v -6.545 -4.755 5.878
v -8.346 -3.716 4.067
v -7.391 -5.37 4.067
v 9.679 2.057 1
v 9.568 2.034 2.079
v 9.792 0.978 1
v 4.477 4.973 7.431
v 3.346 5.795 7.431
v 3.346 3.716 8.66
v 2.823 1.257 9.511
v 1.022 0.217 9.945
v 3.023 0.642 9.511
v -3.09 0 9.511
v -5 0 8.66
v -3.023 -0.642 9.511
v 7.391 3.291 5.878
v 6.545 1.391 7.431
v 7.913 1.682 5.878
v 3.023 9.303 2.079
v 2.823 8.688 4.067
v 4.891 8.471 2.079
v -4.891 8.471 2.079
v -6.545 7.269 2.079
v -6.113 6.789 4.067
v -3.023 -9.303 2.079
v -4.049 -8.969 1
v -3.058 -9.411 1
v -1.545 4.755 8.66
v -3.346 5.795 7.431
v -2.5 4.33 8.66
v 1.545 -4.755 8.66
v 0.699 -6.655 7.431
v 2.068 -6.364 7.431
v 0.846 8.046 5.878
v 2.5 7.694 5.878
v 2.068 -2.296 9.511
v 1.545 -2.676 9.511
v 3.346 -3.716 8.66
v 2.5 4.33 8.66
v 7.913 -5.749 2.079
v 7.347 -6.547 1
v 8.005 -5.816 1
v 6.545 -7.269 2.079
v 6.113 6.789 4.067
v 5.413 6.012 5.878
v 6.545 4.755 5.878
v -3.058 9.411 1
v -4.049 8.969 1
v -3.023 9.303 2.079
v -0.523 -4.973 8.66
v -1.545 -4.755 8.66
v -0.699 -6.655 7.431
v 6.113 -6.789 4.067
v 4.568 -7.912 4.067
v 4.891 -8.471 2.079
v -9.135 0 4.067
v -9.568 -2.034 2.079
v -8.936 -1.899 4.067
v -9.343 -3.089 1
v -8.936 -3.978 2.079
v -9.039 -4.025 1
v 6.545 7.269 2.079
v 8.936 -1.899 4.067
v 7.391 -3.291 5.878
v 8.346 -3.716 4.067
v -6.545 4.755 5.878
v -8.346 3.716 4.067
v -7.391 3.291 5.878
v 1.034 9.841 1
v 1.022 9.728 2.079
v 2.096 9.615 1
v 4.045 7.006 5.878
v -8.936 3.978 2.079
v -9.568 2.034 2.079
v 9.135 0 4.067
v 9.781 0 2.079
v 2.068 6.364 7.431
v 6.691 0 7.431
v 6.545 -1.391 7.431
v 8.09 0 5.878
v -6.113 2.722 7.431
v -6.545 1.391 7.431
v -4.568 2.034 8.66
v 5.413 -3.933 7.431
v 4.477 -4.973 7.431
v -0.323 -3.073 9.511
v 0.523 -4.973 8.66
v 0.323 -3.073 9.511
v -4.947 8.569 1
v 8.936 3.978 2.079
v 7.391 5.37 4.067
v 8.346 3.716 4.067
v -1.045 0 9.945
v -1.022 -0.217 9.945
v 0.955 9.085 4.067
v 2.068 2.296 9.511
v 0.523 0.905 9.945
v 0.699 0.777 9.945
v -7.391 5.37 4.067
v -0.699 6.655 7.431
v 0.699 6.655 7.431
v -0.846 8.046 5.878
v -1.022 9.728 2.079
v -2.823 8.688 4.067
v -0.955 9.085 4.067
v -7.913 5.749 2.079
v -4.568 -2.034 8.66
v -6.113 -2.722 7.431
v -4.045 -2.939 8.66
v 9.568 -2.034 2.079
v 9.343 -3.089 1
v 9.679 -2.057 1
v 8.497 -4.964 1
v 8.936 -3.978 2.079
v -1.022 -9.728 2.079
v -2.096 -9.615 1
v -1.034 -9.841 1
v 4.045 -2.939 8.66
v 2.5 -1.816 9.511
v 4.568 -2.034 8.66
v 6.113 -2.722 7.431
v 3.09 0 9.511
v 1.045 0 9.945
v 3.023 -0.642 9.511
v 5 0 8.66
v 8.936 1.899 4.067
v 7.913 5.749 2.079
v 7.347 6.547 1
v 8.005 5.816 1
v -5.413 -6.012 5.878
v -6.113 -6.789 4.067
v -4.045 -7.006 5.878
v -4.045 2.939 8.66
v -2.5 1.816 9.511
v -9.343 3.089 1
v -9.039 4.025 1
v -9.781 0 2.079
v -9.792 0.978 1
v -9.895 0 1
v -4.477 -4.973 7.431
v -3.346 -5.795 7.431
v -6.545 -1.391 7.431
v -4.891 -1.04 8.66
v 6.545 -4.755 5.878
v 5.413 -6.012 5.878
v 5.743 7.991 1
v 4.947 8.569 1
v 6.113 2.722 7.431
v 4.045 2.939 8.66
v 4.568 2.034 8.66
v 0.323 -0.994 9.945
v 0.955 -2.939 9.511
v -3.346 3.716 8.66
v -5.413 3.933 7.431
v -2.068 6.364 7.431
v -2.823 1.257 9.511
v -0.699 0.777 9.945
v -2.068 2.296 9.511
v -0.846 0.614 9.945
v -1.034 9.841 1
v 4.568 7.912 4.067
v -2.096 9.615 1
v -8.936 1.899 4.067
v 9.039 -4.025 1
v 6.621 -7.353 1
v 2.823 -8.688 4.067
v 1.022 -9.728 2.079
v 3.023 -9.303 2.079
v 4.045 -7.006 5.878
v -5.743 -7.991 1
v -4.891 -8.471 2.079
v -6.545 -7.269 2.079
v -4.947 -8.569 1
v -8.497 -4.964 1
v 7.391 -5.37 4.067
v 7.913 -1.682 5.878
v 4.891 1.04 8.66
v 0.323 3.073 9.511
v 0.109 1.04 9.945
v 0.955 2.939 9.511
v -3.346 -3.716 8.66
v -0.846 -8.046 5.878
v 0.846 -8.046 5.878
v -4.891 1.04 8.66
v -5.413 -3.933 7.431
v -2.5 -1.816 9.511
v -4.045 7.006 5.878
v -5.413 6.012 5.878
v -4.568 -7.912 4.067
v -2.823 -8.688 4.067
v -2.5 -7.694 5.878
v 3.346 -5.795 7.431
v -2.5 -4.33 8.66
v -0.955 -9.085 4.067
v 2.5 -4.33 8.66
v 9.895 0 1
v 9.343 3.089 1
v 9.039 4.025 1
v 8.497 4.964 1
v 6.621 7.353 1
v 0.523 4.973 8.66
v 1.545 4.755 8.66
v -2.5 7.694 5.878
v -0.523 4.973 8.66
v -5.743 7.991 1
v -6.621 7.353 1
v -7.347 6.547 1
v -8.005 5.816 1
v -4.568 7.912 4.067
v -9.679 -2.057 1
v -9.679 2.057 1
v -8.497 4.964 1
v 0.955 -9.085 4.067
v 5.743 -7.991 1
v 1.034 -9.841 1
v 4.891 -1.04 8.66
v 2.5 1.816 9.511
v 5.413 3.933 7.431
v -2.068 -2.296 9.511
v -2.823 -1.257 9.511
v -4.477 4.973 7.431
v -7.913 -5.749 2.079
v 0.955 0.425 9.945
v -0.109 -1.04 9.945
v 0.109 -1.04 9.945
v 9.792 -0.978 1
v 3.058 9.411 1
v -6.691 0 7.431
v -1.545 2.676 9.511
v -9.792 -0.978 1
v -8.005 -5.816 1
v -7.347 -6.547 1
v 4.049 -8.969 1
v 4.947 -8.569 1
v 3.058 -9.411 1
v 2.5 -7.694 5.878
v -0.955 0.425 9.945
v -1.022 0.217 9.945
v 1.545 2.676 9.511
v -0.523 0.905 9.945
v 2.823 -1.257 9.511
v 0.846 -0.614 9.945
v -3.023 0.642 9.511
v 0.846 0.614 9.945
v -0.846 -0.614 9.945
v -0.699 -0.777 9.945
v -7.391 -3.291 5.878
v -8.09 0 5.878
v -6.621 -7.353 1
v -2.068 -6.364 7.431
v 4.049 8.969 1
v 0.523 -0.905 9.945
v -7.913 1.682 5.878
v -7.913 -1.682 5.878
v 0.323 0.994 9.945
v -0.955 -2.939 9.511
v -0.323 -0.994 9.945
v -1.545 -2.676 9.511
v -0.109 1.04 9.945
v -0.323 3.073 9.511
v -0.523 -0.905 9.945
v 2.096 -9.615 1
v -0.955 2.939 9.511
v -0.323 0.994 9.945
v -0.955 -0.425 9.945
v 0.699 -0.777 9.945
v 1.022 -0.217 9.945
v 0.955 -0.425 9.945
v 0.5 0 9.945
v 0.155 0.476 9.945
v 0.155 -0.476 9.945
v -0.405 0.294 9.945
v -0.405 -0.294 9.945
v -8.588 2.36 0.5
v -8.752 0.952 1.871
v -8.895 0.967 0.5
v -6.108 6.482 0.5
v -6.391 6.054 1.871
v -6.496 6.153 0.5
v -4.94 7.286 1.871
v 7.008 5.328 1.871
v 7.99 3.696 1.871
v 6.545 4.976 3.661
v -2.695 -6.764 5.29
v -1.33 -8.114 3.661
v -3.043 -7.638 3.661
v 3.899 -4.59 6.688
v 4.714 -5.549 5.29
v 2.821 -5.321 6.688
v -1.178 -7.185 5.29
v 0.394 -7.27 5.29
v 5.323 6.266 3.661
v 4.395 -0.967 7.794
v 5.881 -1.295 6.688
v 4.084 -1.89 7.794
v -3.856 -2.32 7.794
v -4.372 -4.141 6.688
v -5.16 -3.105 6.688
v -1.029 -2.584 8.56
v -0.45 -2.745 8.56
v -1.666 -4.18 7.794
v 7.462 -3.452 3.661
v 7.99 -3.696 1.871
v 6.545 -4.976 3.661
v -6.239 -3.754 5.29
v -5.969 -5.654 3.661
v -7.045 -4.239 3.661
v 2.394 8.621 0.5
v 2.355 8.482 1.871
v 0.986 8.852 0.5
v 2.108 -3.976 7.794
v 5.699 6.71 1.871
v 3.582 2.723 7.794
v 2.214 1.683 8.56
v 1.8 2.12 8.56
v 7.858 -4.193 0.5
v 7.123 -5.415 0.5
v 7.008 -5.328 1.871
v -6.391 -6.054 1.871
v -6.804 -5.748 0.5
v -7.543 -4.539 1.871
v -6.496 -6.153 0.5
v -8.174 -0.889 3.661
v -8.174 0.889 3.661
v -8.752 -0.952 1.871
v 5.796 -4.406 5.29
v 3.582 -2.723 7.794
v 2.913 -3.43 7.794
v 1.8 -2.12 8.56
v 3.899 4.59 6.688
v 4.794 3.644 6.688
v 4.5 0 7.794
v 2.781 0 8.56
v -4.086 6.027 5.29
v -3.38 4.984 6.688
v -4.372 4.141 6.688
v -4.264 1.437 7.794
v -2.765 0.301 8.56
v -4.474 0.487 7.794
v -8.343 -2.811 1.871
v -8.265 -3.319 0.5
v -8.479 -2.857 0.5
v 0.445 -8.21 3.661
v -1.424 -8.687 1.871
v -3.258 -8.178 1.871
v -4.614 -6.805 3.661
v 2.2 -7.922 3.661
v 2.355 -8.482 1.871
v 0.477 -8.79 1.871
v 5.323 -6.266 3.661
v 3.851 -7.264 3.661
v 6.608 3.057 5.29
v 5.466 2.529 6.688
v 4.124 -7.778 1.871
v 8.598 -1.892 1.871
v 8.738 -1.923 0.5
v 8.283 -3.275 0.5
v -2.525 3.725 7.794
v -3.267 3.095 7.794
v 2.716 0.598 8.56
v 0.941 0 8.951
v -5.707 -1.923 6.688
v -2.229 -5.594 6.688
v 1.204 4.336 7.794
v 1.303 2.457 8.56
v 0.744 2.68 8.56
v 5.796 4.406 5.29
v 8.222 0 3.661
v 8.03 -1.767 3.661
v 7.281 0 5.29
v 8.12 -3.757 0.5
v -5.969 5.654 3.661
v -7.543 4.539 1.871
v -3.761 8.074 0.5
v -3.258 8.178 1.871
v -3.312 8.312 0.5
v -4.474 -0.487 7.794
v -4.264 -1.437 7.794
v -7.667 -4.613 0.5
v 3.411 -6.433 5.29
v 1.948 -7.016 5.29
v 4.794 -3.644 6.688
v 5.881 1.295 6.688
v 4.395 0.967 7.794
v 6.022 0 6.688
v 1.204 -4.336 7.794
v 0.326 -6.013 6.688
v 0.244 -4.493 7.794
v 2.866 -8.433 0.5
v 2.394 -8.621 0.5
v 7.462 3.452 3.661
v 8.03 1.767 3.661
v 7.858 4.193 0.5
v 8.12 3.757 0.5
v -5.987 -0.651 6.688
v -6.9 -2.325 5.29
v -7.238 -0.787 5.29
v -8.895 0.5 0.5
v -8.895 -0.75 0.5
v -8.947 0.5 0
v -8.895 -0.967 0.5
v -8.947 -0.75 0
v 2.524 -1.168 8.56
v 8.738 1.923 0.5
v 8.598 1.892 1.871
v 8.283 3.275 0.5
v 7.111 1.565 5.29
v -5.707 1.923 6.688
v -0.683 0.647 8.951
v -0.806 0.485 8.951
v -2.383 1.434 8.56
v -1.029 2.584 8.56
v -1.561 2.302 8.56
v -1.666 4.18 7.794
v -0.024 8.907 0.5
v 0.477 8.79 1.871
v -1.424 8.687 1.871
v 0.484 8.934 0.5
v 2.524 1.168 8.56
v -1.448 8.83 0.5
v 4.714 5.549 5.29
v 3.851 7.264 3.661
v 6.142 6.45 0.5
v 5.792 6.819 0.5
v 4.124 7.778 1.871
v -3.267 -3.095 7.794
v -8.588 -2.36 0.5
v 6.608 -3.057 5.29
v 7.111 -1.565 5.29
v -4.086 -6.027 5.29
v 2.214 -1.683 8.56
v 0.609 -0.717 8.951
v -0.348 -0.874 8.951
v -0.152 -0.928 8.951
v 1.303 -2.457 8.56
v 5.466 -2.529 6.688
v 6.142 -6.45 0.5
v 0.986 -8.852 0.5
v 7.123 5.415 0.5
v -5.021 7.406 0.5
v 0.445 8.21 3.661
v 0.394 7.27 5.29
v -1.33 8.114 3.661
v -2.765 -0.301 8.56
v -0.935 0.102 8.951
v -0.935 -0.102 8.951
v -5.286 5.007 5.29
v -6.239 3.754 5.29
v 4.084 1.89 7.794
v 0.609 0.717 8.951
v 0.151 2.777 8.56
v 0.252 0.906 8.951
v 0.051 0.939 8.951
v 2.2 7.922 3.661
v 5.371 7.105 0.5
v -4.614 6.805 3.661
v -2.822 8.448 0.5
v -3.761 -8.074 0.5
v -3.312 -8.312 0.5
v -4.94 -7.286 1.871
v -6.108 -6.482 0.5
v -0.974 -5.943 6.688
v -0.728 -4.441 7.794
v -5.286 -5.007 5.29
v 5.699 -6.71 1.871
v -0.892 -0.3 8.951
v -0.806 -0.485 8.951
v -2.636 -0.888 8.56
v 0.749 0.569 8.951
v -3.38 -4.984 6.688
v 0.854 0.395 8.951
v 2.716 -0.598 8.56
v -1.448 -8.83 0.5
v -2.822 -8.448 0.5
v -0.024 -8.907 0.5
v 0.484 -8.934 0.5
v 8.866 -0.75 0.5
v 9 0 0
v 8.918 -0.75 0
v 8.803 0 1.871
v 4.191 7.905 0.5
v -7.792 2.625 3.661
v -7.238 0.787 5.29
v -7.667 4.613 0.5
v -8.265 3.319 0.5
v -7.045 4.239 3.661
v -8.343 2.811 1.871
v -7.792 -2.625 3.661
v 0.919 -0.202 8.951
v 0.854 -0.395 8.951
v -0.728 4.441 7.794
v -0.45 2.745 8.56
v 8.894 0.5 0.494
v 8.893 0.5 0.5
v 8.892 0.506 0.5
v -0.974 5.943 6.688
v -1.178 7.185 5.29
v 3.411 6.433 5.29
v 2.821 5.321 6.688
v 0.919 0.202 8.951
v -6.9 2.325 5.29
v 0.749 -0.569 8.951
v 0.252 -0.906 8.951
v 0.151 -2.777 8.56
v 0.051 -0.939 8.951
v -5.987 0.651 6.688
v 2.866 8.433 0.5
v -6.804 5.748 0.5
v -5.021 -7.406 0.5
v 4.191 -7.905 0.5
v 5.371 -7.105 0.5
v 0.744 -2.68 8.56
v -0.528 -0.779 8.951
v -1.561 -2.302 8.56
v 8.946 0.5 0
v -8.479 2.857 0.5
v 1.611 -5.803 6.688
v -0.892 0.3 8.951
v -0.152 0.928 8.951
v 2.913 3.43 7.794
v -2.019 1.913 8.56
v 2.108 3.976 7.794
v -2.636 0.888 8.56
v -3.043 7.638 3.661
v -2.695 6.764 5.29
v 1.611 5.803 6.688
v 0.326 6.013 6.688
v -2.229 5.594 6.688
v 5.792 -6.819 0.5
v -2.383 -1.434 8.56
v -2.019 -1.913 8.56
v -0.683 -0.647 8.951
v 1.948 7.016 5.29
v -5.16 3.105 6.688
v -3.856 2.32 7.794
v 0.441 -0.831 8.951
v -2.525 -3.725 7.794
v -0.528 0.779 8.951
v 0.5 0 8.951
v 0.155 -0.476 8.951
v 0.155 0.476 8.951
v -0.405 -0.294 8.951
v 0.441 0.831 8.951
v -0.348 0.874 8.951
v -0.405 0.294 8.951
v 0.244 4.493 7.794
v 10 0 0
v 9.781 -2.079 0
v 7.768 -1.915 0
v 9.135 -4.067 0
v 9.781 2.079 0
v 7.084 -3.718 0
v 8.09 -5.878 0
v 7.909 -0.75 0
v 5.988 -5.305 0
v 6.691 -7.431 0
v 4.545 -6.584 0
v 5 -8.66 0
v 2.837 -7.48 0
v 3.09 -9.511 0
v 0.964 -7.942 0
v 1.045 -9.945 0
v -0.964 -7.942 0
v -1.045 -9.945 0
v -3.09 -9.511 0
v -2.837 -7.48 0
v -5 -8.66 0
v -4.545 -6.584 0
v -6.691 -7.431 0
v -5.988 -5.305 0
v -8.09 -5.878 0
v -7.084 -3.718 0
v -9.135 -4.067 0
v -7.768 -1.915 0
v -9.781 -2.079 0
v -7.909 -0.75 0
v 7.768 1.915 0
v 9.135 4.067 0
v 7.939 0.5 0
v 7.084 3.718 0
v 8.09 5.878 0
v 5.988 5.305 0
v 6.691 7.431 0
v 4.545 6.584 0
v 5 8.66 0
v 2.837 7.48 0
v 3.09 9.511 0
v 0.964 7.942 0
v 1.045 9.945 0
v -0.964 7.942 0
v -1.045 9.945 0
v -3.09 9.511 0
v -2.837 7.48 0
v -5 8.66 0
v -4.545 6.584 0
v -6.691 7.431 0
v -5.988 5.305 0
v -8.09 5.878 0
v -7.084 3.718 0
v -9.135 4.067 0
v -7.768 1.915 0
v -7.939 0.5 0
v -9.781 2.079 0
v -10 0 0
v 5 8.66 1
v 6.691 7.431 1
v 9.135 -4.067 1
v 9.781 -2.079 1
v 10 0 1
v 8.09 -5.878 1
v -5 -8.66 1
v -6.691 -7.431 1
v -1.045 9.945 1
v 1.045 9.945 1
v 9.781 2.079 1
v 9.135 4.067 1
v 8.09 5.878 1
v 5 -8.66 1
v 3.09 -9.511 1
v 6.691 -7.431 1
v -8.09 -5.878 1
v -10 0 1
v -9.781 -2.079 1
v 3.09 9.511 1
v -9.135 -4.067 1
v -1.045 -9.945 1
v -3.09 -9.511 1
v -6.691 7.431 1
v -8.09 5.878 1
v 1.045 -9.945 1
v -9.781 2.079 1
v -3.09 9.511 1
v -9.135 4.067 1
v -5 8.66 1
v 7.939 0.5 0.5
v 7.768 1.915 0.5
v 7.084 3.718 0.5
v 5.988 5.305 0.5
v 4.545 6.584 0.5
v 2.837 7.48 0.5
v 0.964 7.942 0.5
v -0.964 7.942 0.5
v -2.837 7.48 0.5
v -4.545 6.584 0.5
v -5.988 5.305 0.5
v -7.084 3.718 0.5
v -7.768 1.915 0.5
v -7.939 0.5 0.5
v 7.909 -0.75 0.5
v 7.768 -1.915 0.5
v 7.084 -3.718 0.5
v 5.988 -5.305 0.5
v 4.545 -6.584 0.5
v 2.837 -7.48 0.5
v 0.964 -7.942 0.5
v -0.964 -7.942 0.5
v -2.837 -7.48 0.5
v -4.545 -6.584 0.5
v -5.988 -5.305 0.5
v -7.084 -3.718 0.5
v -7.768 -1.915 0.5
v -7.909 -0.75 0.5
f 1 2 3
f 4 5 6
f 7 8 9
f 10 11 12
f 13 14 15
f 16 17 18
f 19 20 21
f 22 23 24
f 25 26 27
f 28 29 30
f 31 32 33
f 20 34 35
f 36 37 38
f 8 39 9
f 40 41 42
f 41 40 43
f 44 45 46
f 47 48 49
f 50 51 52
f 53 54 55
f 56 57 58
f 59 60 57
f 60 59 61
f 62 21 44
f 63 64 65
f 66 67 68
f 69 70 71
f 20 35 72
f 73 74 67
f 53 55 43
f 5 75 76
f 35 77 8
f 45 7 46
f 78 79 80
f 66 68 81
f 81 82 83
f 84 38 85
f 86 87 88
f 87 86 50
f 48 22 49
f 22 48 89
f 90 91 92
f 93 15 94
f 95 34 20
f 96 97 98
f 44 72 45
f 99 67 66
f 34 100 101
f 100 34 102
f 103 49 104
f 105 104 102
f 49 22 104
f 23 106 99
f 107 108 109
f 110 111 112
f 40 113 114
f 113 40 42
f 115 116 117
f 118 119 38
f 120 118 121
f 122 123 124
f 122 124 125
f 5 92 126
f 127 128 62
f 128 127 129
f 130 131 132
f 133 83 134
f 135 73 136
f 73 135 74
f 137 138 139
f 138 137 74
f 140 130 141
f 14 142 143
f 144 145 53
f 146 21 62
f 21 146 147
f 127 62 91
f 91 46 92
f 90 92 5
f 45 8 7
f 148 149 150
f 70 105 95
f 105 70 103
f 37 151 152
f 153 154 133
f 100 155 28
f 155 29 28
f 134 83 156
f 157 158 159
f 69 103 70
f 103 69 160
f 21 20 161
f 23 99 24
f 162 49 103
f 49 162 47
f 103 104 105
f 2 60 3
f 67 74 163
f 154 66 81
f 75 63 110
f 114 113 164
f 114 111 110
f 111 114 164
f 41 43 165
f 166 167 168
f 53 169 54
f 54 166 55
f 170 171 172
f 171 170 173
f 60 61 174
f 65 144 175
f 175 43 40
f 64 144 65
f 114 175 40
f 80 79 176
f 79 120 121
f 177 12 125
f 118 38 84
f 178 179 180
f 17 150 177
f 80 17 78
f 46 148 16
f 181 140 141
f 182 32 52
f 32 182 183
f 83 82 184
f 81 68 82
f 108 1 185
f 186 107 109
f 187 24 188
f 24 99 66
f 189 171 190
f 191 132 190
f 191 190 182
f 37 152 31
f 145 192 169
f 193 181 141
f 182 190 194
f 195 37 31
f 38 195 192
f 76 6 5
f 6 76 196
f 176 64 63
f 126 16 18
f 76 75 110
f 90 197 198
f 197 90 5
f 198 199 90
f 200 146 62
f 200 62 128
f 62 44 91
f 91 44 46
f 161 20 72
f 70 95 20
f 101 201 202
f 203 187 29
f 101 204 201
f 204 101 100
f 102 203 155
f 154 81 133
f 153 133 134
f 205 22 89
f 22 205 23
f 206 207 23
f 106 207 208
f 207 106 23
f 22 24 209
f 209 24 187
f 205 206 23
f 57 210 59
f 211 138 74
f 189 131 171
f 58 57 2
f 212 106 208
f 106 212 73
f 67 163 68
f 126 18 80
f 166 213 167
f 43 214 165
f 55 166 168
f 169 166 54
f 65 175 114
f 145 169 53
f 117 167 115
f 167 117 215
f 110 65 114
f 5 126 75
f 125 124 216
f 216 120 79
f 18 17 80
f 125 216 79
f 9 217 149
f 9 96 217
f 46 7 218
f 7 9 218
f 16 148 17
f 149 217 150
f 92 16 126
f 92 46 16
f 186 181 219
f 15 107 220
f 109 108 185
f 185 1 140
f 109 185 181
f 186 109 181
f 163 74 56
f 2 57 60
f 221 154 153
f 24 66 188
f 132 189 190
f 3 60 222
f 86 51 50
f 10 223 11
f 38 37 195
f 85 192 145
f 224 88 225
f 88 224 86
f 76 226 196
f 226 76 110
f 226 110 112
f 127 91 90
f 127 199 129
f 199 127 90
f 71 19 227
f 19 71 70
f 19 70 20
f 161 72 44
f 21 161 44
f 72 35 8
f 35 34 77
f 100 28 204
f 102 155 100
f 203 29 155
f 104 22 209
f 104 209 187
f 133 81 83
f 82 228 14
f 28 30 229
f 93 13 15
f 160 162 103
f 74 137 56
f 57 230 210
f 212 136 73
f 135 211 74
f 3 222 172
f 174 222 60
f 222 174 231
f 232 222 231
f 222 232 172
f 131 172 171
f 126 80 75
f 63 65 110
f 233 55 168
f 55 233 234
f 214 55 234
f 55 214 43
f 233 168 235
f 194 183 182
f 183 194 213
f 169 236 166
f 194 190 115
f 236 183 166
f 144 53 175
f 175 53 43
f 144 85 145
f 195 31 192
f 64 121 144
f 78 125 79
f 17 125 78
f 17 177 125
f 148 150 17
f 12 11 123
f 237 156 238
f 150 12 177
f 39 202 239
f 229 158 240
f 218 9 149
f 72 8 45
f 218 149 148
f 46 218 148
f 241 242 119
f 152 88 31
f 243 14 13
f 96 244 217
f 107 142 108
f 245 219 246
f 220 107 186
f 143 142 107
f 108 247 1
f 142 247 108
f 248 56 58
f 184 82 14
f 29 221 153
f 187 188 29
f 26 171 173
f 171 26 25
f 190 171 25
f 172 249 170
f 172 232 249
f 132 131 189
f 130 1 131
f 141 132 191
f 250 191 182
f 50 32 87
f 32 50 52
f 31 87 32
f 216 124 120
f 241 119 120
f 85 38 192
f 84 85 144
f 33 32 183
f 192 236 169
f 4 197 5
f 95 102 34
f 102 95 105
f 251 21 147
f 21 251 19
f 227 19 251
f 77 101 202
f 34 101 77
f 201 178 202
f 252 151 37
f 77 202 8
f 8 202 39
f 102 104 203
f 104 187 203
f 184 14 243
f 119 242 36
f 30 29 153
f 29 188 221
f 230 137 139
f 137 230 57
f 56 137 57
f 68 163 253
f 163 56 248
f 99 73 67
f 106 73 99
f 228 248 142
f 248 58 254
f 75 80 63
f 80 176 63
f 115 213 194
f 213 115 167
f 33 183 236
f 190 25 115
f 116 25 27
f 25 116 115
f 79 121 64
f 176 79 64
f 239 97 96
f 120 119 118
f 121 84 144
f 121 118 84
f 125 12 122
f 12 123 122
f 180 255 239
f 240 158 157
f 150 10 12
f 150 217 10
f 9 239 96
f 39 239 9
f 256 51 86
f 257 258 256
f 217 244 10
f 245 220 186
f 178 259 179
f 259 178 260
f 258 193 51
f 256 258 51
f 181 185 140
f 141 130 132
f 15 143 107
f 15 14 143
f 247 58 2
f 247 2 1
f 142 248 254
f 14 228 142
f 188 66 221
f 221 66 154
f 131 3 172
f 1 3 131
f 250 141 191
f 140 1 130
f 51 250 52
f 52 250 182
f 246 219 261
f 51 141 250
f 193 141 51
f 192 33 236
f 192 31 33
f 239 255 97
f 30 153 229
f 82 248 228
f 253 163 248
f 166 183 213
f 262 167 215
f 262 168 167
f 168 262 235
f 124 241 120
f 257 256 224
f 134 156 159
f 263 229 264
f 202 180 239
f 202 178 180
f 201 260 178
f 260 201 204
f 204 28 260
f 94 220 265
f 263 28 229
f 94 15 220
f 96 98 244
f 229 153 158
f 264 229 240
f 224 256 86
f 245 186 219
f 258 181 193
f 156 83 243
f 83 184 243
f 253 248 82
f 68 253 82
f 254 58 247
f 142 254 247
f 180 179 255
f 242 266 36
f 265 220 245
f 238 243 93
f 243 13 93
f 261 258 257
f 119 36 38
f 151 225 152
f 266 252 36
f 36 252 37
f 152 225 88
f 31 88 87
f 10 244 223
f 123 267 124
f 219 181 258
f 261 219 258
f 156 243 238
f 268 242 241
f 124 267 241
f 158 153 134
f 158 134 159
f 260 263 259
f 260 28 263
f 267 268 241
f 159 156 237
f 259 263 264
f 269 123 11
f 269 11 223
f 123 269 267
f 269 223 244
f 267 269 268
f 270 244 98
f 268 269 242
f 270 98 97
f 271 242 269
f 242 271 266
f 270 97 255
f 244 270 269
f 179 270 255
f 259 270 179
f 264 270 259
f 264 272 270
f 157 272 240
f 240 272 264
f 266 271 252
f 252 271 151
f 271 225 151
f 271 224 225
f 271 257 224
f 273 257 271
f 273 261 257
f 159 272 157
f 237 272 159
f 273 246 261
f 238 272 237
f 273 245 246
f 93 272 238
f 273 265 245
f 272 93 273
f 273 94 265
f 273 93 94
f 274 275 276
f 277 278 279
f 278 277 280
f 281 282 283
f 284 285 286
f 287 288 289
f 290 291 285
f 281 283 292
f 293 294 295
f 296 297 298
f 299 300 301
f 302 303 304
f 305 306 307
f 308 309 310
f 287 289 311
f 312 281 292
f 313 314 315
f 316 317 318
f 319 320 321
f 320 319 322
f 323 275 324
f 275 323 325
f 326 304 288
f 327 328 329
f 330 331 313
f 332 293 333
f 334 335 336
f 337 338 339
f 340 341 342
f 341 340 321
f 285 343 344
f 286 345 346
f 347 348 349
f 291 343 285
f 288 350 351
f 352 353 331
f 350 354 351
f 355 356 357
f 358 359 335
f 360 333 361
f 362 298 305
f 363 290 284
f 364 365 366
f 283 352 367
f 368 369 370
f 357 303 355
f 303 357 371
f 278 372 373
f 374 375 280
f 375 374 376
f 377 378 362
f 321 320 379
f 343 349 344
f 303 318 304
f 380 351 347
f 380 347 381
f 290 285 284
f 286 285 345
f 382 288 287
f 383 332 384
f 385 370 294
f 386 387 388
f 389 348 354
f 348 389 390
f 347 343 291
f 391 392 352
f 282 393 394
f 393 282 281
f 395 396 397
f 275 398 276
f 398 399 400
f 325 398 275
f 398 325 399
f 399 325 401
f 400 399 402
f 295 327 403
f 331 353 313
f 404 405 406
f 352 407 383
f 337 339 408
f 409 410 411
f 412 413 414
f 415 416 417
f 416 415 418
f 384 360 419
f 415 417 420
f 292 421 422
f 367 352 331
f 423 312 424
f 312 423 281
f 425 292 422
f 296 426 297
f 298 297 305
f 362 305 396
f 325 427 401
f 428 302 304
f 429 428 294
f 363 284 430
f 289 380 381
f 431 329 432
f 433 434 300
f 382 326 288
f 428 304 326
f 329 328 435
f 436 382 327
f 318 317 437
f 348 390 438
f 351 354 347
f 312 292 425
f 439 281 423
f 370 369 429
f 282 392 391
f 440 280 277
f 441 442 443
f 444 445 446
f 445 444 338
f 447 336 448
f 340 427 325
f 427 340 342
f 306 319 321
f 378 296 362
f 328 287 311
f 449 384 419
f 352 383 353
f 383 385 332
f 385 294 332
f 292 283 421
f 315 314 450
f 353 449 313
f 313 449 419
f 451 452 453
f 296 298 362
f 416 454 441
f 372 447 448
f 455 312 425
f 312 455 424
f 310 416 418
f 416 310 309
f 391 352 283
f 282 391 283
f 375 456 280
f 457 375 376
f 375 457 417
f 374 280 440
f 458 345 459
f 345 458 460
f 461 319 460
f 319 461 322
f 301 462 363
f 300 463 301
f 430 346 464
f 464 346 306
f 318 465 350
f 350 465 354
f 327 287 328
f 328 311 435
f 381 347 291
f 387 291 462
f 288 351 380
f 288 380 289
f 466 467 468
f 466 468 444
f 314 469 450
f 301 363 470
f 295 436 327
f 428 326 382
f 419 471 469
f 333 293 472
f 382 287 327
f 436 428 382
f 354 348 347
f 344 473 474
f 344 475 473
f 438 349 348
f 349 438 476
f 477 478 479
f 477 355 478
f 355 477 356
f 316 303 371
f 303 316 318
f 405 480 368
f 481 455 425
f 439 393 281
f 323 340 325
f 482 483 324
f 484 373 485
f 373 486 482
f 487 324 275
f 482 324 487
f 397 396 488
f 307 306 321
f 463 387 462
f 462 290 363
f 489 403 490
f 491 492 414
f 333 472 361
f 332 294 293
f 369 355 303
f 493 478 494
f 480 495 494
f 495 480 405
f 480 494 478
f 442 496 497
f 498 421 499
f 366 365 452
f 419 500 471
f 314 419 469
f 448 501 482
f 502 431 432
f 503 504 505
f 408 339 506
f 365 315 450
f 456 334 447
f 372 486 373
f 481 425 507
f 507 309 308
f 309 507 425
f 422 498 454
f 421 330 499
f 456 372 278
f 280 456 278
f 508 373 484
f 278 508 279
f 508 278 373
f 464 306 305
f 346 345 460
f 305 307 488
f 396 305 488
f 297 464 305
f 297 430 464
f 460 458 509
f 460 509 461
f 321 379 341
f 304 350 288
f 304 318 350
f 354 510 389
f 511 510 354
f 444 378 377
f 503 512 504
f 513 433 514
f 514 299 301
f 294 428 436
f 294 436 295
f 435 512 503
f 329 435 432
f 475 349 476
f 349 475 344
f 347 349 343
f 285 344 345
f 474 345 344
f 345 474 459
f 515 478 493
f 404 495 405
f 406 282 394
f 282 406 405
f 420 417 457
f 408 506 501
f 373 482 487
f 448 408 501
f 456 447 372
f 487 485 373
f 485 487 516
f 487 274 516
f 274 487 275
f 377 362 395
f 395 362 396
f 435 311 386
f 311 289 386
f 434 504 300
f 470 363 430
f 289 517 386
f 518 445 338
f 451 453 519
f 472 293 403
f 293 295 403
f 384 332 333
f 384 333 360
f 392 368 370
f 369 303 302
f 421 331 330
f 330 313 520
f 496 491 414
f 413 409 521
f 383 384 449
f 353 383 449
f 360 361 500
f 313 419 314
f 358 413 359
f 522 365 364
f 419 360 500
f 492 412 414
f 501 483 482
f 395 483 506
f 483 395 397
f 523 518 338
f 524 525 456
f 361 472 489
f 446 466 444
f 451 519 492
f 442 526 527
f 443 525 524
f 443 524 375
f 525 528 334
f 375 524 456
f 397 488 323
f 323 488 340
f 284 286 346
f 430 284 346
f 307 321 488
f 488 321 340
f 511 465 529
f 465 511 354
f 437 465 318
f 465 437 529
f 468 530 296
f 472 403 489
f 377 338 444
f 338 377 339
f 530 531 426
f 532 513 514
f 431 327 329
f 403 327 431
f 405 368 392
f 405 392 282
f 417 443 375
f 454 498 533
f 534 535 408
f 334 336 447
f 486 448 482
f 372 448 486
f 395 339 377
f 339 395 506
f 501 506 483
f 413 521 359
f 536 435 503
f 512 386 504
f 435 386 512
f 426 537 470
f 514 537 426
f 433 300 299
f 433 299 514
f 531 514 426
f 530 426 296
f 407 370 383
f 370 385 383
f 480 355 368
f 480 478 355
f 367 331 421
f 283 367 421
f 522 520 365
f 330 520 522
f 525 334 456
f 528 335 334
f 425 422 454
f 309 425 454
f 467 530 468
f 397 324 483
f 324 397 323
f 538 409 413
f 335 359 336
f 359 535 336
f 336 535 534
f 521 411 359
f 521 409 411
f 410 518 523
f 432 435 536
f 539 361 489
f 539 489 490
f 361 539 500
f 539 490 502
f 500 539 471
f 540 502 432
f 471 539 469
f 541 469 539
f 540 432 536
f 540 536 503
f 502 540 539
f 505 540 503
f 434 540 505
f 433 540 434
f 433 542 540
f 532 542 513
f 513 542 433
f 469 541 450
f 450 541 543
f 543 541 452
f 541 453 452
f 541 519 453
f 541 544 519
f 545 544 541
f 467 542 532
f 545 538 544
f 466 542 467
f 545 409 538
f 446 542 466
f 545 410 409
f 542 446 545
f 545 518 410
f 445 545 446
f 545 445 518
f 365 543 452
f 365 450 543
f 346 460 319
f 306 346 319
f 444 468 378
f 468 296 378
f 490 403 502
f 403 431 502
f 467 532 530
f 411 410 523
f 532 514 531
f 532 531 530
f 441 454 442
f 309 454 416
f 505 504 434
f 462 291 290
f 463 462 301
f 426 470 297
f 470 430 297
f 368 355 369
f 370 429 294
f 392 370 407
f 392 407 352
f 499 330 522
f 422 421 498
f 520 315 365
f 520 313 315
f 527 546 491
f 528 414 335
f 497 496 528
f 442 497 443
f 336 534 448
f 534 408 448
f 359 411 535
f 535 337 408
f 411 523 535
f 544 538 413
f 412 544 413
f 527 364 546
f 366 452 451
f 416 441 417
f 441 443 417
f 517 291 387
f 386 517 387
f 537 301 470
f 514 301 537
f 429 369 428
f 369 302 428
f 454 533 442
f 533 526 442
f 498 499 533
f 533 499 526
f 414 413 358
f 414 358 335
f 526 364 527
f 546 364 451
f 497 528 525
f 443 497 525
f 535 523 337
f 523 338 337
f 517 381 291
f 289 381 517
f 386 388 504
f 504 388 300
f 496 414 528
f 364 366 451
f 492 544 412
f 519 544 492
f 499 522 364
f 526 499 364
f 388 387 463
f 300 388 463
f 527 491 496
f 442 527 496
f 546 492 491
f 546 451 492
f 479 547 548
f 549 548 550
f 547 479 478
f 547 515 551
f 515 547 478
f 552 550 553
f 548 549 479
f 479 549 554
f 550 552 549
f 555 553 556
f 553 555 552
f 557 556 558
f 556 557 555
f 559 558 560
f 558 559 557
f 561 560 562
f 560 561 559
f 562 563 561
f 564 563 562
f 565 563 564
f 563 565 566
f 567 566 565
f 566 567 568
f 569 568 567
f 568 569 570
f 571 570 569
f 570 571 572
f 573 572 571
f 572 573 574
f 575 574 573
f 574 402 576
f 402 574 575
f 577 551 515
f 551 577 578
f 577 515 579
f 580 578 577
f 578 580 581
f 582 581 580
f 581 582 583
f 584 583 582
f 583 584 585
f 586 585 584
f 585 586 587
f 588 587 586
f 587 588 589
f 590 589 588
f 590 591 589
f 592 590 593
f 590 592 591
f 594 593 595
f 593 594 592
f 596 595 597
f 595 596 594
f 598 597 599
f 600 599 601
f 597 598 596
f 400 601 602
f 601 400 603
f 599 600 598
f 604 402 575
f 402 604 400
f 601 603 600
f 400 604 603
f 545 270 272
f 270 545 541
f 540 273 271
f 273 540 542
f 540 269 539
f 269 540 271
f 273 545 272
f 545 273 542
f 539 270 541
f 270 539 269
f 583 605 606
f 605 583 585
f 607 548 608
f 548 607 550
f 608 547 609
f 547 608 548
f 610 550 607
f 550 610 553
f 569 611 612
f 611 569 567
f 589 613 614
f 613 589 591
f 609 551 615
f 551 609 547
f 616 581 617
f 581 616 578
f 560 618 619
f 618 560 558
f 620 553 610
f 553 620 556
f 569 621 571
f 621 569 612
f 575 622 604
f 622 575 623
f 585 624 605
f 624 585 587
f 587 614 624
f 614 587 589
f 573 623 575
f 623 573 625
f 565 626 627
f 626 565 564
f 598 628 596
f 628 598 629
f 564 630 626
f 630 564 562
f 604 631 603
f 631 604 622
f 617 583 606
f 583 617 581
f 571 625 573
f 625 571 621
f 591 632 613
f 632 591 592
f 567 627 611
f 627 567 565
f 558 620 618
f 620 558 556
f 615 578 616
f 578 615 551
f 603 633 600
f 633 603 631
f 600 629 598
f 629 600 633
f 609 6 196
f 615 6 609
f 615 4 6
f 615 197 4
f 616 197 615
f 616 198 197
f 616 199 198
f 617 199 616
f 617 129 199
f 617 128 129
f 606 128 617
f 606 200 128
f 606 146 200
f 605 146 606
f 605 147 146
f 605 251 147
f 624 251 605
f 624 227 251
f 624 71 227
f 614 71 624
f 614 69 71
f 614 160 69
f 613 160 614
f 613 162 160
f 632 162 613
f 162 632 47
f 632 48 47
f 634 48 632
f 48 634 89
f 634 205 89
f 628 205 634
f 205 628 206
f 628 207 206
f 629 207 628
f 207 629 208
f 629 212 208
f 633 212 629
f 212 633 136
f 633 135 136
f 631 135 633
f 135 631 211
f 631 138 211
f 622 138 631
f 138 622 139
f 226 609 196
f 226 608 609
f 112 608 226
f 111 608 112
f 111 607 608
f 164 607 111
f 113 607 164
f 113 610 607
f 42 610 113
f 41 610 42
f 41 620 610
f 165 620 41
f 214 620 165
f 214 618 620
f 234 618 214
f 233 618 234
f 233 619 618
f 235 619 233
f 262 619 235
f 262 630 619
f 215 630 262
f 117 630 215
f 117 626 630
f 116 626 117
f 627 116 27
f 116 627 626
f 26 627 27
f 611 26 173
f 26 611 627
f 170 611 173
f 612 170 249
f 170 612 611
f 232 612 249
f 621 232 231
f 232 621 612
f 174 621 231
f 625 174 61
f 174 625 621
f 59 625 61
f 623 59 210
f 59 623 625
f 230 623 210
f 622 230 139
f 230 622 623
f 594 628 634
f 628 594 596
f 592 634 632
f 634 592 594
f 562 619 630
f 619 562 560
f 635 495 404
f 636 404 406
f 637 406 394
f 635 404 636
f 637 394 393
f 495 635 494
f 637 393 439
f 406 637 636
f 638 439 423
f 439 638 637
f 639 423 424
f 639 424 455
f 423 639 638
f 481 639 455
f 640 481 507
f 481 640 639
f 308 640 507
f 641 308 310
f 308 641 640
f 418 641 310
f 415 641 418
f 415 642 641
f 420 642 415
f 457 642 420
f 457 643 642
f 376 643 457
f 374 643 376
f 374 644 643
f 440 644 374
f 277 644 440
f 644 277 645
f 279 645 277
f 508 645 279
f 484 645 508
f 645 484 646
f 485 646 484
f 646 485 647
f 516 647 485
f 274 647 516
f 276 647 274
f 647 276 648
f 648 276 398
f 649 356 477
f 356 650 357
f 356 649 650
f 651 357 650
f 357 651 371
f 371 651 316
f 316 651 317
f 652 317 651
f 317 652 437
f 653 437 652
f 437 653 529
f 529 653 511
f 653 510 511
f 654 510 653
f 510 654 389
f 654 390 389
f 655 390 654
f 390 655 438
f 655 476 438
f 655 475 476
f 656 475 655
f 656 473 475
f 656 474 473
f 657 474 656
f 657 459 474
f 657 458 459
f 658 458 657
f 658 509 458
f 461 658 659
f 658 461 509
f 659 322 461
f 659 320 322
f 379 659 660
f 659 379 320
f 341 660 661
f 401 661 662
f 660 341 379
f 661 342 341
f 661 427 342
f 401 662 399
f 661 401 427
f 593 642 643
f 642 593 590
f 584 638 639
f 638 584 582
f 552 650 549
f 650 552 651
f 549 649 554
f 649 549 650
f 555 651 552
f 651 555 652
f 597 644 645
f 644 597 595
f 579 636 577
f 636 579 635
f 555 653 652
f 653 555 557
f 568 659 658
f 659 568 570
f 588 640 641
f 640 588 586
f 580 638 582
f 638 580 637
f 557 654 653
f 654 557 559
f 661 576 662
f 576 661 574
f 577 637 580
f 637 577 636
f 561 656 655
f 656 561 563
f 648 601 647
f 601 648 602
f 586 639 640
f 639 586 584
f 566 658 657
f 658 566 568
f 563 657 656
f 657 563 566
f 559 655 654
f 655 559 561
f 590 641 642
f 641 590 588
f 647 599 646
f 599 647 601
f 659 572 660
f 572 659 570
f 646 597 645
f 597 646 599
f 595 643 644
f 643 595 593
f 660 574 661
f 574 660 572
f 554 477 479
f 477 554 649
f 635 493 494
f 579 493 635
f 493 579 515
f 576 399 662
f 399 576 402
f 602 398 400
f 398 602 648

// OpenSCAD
//$fn = 100;

rotate([180,0,0]){
difference(){
	sphere(10);
	sphere(9);
	translate([-10,-10,0]) cube(20);
	translate([0,0,-10])cylinder(2,.5,.5);
}

difference(){
	translate([0,0,-1])cylinder(1,10,10);
	translate([0,0,-1])cylinder(1,9,9);
}

difference(){
	translate([0,0,-.5])cylinder(.5,10,10);
	translate([0,0,-.5])cylinder(.5,8,8);
	translate([7.75,-.5,-1]) cube([1.5,1.25,1]);
	translate([-9.25,-.5,-1]) cube([1.5,1.25,1]);
}
}
